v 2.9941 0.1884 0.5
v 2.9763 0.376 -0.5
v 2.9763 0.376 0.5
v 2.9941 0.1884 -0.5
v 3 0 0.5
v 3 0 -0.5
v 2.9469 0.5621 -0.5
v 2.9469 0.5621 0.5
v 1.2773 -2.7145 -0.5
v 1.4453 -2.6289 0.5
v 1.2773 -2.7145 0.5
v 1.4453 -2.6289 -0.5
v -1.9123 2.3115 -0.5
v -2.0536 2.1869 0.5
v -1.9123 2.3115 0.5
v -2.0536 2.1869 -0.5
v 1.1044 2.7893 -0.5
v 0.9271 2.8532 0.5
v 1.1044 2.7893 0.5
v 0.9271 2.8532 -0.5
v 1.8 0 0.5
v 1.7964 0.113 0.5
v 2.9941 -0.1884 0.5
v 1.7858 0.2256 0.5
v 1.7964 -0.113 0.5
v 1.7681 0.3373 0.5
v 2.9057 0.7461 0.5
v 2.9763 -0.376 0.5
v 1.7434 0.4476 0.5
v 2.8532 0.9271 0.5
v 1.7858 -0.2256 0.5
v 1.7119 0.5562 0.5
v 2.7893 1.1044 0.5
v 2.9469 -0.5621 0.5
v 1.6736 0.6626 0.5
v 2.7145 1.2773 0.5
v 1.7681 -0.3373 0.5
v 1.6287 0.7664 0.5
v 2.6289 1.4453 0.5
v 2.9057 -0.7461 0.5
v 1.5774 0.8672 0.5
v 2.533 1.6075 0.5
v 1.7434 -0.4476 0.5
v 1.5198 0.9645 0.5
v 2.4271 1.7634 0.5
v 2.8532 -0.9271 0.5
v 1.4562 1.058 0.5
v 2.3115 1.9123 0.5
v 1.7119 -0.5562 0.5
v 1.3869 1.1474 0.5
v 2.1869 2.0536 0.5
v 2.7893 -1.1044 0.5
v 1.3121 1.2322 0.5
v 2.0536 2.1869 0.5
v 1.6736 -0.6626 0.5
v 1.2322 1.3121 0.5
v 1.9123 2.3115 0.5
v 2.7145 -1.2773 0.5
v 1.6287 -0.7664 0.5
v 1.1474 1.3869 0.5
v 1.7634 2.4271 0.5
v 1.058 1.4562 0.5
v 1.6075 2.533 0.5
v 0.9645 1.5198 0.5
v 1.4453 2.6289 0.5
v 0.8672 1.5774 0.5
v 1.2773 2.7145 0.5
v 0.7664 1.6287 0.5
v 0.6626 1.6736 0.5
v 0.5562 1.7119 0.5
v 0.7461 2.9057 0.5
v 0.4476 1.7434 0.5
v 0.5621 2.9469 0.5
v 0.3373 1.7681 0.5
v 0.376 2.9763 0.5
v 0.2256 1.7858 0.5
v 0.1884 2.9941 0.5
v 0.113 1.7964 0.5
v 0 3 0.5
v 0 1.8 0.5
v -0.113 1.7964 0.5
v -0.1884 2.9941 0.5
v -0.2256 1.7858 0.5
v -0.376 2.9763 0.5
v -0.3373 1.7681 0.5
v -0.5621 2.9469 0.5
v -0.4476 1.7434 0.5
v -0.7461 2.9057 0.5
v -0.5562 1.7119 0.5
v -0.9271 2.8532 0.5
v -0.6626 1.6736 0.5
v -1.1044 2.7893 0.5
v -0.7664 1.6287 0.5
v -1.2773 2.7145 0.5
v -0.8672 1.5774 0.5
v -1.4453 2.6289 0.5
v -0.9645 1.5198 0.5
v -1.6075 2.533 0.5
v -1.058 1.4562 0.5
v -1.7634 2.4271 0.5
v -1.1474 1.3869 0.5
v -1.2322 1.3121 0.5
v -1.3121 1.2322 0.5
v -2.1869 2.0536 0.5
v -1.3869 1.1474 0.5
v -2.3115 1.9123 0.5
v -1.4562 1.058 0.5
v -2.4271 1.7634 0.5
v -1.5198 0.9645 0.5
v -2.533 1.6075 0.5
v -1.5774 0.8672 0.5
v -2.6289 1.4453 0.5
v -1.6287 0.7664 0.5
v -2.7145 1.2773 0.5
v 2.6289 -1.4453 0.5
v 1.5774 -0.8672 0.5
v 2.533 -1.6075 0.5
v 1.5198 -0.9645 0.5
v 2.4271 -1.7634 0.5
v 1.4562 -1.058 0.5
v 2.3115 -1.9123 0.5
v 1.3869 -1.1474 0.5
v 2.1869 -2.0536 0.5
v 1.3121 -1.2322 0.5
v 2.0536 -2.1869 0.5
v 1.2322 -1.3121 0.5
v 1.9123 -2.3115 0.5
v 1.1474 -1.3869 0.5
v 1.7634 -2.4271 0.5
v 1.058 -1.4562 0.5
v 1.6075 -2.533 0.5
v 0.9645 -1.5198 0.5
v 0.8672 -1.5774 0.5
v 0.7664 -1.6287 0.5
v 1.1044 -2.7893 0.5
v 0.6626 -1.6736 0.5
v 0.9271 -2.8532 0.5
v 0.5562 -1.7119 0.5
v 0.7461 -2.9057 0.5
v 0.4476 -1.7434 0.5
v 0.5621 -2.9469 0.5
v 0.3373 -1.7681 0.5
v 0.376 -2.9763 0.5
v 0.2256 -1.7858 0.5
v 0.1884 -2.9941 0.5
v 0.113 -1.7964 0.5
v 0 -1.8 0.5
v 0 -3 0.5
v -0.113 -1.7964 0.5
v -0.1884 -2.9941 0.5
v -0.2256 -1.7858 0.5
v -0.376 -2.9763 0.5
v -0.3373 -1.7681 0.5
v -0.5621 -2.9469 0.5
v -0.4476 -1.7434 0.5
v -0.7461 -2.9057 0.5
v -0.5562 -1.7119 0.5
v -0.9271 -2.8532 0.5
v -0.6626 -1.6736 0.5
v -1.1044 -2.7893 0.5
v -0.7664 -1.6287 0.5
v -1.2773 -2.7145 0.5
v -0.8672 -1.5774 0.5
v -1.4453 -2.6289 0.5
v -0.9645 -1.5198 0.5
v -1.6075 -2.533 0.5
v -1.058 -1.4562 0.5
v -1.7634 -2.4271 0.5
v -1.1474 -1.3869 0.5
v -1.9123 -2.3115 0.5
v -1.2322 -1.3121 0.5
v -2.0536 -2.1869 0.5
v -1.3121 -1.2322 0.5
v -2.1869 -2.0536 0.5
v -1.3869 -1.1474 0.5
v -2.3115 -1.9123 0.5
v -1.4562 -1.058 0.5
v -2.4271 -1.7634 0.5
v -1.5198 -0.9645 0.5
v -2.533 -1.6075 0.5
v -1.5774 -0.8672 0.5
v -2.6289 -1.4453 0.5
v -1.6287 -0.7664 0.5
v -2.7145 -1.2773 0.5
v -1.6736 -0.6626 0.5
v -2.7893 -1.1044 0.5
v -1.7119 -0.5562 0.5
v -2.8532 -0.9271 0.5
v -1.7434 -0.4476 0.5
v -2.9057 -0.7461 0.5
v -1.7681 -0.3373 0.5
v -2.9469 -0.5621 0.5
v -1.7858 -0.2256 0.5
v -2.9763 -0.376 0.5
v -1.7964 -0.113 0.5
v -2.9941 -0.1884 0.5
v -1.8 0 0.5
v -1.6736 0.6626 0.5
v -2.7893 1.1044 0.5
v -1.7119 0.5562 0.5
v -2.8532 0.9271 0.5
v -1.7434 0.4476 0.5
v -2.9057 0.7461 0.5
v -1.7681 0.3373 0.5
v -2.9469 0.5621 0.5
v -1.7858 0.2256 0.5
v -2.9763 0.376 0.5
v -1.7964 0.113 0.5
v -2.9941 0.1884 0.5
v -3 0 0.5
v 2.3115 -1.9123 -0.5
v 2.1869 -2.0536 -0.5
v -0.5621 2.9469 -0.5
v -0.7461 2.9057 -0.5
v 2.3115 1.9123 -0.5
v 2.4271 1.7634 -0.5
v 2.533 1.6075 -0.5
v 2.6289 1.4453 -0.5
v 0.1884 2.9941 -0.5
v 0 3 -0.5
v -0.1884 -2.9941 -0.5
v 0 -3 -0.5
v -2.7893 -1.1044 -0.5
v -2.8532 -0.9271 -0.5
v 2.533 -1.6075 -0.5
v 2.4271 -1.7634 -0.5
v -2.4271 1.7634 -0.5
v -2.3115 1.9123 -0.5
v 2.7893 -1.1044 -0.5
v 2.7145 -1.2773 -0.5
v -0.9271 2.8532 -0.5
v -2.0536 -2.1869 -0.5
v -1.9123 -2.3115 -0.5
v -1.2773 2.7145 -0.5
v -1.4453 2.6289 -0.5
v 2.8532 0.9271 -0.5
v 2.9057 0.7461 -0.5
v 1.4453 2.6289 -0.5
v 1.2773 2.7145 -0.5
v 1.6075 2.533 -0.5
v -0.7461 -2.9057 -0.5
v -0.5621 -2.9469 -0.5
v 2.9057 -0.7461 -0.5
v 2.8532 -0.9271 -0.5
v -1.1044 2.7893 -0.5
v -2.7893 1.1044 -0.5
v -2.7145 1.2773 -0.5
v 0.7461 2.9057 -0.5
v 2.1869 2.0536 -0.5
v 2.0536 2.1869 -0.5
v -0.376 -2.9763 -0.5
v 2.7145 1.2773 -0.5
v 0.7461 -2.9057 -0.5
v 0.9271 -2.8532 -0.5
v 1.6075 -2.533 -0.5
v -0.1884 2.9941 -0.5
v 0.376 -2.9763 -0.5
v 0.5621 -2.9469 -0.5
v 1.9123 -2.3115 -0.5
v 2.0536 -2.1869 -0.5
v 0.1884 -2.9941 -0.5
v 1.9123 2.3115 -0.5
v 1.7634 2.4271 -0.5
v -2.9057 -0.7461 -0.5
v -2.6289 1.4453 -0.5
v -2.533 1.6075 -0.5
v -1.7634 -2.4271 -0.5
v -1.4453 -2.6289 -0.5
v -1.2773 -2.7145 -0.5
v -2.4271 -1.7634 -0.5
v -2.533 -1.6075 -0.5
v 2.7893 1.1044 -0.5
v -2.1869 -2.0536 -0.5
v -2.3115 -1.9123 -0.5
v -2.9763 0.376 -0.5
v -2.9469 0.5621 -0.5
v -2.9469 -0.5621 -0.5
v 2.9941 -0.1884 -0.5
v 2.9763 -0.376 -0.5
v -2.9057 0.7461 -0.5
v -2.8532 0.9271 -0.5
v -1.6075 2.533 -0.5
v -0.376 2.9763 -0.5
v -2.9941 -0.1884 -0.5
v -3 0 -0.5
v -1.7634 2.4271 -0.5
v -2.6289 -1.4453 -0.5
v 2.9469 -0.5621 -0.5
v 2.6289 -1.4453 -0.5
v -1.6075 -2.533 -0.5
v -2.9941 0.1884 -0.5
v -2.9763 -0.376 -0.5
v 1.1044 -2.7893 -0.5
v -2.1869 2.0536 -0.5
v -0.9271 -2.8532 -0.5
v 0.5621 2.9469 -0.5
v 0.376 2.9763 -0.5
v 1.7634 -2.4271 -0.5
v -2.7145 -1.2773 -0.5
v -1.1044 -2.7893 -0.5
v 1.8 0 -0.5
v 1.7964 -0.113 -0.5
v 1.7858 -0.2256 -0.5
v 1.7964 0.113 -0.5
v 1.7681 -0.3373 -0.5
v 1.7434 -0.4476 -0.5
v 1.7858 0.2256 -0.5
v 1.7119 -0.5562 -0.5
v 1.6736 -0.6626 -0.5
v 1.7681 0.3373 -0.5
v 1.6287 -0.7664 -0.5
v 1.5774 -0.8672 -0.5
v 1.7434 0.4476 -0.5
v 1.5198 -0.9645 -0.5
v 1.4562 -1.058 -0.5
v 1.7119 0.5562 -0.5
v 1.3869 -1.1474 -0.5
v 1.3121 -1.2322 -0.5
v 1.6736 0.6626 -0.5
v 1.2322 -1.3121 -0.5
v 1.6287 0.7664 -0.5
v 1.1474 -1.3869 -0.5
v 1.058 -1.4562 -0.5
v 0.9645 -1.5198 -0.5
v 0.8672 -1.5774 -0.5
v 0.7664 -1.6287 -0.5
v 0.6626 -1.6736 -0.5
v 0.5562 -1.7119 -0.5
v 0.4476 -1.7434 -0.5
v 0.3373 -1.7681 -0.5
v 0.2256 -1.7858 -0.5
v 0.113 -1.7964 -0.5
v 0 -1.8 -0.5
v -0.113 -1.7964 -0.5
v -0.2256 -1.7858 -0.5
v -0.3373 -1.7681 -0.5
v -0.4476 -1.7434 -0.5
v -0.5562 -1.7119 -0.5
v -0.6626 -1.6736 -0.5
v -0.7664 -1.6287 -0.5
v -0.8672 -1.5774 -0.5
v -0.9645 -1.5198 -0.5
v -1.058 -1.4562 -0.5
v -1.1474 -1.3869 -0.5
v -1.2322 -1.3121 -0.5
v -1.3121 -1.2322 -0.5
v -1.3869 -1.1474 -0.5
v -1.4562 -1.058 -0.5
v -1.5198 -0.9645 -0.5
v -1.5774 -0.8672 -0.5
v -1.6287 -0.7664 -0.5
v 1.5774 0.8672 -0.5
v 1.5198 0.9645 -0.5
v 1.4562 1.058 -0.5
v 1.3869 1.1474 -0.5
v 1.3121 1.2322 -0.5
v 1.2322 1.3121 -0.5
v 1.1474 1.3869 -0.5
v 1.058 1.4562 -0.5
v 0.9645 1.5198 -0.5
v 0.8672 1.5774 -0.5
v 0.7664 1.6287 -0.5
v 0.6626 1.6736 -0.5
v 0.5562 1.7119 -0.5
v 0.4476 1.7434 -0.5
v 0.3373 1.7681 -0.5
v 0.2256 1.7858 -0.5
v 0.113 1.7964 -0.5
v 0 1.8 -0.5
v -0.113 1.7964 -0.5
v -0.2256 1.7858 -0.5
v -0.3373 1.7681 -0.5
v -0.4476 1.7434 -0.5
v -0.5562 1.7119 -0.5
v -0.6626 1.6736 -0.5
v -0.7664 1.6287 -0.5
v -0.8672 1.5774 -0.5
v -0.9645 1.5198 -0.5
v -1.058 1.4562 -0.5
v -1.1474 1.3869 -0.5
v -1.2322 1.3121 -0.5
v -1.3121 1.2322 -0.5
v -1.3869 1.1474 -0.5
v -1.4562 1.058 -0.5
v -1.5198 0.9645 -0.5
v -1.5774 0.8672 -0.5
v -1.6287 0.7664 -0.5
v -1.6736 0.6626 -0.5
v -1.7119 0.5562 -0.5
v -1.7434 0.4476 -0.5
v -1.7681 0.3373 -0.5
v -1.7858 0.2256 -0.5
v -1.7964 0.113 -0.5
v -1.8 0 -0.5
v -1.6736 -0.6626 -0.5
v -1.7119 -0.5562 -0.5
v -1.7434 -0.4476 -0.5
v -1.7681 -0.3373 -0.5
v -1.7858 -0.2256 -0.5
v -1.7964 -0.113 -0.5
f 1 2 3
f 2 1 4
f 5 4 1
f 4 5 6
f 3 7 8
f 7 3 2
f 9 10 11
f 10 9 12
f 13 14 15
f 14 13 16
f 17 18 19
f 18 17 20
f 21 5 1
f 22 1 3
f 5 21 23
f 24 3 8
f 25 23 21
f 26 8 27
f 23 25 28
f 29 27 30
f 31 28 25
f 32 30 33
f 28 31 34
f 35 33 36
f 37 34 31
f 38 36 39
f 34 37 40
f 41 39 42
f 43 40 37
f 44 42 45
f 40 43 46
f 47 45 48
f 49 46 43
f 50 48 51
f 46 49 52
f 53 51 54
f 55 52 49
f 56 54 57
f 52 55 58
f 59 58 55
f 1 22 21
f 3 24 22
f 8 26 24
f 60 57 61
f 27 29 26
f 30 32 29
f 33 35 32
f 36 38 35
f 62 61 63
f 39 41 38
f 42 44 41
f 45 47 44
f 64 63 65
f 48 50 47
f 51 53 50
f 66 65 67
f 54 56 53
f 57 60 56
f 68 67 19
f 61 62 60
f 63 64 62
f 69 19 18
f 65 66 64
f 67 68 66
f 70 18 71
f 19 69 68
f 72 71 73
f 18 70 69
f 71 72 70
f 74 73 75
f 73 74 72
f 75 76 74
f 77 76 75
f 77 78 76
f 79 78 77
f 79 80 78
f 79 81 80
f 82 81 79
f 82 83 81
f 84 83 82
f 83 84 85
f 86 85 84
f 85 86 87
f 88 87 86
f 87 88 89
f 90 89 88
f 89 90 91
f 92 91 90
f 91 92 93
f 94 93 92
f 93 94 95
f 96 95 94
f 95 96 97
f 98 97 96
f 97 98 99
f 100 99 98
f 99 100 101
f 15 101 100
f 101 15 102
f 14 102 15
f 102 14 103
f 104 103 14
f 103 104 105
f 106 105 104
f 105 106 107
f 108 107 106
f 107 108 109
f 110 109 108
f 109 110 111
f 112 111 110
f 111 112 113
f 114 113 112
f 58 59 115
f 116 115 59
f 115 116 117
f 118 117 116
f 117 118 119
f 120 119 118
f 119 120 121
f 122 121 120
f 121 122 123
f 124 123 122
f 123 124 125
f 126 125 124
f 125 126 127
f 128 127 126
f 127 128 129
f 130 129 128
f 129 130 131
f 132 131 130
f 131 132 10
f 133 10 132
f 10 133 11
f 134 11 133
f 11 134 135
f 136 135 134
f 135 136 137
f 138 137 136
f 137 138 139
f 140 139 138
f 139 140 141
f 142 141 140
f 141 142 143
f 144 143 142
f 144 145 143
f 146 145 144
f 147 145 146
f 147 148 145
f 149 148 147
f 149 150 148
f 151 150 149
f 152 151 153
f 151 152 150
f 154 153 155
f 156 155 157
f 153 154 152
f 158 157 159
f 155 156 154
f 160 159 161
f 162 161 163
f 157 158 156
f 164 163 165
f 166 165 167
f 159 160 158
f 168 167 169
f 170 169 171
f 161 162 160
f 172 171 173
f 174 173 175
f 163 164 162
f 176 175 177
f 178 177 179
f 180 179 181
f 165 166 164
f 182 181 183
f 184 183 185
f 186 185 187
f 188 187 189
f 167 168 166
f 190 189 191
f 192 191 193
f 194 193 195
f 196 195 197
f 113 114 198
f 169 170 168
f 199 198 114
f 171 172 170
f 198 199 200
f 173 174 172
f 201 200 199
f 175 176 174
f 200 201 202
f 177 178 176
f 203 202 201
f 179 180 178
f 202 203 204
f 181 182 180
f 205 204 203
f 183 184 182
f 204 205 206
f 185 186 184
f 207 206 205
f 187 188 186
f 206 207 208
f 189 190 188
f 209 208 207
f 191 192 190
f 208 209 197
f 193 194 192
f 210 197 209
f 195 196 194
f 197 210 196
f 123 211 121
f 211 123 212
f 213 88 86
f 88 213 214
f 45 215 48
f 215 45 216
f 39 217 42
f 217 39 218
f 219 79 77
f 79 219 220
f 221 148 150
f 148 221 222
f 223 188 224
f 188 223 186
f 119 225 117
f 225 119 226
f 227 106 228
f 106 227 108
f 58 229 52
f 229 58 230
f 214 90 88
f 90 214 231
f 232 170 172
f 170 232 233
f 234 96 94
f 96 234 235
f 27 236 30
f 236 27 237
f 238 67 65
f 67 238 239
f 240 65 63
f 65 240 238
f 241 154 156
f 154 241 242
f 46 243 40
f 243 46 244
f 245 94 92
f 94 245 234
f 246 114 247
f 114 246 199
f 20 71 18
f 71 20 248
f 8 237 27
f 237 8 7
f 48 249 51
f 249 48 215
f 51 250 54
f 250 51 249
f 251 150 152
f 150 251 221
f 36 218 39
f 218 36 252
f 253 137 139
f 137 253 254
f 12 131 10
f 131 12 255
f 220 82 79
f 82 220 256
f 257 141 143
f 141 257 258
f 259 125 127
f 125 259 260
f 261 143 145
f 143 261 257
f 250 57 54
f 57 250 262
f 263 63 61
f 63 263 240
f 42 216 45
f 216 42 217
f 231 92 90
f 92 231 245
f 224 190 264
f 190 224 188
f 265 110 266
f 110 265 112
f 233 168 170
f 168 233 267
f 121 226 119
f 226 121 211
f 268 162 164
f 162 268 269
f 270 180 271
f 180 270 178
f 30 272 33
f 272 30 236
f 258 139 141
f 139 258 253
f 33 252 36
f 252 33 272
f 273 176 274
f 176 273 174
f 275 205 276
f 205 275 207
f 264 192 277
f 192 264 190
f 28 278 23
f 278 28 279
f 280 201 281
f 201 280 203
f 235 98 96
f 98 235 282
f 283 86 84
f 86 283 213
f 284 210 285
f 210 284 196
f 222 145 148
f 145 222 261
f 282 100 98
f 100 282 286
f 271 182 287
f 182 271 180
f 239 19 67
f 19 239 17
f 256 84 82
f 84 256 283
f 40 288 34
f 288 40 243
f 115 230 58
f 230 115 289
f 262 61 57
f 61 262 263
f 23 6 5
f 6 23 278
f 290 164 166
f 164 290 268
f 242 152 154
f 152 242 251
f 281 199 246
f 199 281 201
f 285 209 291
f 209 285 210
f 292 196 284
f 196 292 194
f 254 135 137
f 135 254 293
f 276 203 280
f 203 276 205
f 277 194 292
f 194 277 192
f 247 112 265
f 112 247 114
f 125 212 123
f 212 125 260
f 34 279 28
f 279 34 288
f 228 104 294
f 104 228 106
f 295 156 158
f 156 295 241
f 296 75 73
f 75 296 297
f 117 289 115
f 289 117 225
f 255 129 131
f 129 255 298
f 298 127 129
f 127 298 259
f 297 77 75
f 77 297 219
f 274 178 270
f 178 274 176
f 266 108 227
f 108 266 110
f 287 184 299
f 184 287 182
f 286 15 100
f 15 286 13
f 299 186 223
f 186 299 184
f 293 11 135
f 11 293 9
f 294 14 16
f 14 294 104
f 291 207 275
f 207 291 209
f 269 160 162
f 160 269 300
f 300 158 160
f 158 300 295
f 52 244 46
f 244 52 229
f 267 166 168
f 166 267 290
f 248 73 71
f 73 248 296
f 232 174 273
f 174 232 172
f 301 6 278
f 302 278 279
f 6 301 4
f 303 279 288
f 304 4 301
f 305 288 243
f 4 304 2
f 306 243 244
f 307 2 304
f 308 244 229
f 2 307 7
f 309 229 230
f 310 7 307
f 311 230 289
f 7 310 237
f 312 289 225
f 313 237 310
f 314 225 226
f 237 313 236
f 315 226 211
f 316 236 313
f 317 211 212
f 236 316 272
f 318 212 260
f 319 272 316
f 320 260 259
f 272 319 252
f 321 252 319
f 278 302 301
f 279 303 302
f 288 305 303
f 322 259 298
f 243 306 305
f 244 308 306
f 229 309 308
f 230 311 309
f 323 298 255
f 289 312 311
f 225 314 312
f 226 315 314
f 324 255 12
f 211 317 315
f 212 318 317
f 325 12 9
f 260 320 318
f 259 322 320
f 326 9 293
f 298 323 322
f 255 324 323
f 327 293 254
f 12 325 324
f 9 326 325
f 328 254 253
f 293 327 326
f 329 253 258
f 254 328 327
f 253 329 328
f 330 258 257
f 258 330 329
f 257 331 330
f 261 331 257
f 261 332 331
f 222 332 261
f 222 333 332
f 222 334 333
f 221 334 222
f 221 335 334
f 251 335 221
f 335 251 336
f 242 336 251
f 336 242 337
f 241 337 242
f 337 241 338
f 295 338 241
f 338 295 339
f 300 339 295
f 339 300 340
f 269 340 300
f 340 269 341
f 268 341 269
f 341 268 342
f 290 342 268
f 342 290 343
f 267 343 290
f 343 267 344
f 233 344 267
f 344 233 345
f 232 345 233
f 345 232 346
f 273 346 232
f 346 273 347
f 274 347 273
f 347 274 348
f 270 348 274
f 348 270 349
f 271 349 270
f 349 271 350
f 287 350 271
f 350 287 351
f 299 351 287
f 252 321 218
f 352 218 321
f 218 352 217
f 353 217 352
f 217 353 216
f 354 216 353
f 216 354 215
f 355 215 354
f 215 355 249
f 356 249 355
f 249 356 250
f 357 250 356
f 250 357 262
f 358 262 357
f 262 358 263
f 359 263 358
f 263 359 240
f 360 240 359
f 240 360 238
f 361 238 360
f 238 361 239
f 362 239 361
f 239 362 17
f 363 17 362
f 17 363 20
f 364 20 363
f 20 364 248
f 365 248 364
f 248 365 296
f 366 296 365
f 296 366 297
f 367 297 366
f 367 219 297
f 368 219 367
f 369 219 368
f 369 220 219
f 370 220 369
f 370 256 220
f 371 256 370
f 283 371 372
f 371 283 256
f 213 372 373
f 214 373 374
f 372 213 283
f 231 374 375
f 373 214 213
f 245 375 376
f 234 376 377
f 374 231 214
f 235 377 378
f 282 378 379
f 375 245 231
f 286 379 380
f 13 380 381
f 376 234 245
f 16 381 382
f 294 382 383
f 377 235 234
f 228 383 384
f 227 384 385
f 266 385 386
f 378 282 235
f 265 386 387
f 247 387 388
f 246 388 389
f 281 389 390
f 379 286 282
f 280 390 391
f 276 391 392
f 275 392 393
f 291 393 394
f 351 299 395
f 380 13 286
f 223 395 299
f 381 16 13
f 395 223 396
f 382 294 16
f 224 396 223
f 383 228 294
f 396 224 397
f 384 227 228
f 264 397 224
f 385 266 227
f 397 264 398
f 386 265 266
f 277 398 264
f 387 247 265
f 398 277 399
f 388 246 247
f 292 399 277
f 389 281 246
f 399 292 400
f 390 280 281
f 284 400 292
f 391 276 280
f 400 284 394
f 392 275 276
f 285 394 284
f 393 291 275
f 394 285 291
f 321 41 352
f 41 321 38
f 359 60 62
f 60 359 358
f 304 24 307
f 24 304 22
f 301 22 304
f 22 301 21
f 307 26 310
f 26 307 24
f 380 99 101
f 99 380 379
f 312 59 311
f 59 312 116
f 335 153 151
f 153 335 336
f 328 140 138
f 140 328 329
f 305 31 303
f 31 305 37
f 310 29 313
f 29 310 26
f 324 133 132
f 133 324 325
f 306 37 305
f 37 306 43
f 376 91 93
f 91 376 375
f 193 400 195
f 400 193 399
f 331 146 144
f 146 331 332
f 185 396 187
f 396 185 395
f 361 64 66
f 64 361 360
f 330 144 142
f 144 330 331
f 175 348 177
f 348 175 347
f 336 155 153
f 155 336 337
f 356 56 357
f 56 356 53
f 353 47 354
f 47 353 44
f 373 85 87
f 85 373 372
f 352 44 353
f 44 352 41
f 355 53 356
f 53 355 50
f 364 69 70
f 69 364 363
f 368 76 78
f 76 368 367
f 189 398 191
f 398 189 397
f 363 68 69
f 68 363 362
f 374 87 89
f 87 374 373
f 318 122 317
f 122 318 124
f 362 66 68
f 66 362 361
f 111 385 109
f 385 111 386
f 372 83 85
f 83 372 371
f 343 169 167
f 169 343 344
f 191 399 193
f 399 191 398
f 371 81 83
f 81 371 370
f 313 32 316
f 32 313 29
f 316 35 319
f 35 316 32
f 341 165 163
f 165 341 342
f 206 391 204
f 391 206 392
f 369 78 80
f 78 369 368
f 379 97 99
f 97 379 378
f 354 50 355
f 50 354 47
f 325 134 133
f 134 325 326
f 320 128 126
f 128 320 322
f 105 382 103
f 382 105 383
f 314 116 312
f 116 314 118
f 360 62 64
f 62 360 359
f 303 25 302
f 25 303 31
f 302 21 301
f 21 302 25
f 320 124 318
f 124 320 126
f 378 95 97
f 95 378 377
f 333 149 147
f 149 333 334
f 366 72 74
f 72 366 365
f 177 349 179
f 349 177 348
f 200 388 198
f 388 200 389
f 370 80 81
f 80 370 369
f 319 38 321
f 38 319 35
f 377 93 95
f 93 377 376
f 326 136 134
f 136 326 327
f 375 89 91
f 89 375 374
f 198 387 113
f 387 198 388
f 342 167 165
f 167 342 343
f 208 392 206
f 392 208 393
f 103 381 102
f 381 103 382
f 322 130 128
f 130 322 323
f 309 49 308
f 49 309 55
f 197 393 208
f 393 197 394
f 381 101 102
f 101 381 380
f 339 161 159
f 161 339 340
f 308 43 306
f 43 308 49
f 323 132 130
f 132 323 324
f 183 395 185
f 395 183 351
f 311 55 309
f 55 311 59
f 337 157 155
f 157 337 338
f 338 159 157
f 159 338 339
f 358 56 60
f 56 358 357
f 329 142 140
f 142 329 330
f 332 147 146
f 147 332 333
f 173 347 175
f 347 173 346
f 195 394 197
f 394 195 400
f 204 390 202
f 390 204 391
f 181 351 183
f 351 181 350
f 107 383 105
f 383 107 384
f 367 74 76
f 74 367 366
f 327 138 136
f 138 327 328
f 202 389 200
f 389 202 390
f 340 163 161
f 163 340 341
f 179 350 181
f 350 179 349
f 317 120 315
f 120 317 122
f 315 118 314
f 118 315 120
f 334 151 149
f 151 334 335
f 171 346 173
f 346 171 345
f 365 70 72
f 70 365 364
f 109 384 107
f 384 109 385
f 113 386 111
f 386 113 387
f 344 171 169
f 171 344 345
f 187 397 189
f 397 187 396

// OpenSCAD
difference(){

    cylinder (
        h = 1, 
        r=3, 
        center = true, 
        $fn=100
    );
    cylinder (
        h = 1, 
        r=1.8, 
        center = true, 
        $fn=100
    );
}
